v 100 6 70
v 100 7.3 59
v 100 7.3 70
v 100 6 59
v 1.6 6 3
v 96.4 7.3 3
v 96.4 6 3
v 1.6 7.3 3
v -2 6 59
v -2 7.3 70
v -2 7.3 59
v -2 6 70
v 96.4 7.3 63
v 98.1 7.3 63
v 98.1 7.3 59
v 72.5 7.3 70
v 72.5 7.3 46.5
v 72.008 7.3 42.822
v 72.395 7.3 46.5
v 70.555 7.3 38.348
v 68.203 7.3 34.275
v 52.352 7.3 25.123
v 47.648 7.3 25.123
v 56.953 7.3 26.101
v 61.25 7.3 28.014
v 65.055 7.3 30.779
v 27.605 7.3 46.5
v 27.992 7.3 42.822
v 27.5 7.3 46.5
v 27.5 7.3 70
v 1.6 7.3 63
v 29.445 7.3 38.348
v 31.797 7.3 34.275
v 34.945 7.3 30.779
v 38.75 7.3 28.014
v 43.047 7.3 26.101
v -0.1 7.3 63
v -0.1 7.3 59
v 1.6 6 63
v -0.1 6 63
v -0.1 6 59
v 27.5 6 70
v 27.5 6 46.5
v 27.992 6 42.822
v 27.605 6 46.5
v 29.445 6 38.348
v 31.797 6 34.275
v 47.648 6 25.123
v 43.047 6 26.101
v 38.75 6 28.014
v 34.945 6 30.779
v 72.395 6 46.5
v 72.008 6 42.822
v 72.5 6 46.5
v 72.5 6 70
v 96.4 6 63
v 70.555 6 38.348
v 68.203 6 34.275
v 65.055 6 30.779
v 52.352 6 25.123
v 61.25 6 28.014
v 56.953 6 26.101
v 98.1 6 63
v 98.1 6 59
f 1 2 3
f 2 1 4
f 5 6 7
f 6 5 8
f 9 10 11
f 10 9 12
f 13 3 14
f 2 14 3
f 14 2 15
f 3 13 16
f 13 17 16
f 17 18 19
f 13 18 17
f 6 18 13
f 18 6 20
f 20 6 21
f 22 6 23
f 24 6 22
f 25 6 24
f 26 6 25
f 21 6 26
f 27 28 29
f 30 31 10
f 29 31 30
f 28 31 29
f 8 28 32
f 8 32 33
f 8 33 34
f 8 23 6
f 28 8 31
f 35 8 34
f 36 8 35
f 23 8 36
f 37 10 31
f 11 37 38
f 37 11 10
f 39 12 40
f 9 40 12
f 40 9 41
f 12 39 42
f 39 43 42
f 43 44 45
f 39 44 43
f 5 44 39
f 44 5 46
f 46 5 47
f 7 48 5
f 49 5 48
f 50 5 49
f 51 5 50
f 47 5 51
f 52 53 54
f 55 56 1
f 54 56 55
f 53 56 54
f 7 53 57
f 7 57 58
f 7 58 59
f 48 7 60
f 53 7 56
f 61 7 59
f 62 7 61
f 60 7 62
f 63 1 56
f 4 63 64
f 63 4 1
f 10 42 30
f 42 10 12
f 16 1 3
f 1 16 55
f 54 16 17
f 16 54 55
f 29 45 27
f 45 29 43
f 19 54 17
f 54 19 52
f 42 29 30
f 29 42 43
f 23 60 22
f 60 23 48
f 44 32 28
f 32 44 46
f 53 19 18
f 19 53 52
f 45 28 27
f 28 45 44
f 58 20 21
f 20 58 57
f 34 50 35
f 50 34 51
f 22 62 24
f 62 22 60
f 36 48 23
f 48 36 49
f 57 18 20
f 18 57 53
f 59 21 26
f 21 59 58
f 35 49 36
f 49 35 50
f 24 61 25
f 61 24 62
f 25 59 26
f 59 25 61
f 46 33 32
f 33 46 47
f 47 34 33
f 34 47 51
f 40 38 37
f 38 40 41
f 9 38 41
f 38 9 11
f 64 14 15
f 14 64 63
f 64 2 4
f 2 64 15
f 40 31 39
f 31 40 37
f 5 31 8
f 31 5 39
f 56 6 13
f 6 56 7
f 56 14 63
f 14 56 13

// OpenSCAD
/* [Box Parameters] */


innerWidth = 95;
innerDepth = 145;
innerHeight = 80;

wallThick = 1.5;
totalWidth = innerWidth + (wallThick*2);
cutoutHeight = 30;
cutoutWidth = 45;

cutoutOffsetX = ((wallThick * 2) + innerWidth) / 2 - (cutoutWidth / 2);
cutoutOffsetZ = wallThick + innerHeight - cutoutHeight;
/*
difference() {
    cube([innerWidth + (wallThick * 2),innerDepth + (wallThick * 2),innerHeight + wallThick]);
    translate([wallThick,wallThick,wallThick]) cube([innerWidth,innerDepth,innerHeight + 3]);
    translate([cutoutOffsetX,-1,cutoutOffsetZ]) cube([cutoutWidth,wallThick * 4 + innerDepth,cutoutHeight + 3]);

    translate([cutoutOffsetX,0,innerHeight+wallThick]) rotate([270,90,0])fillet(10,5);

    translate([cutoutOffsetX,innerDepth + wallThick,innerHeight+wallThick]) rotate([270,90,0])fillet(10,5);

    translate([innerWidth+wallThick*2-cutoutOffsetX,0,innerHeight+wallThick]) rotate([90,90,0])fillet(10,5);

    translate([innerWidth+wallThick*2-cutoutOffsetX,innerDepth + wallThick,innerHeight+wallThick]) rotate([90,90,0])fillet(10,5);
    for(i = [12:15:innerDepth-10]) {
        ident(i);
    } 

    color("blue") translate([(innerWidth+(wallThick * 2))/2,150,cutoutOffsetZ])  rotate ([90, 0,0]) cylinder(h=155, r=22.5);
}
  */

   //color("blue") translate([-5,2,60]) cube([105,60,120]);  
//    cube([innerWidth + (wallThick * 2),innerDepth + (wallThick * 2),innerHeight + wallThick]);
//anslate([wallThick,wallThick,wallThick]) cube([innerWidth,innerDepth,innerHeight + 3]);
 difference() {
    translate([-2,6   , 3])color("red") cube([innerWidth + (wallThick * 2)+4,wallThick-0.2,innerHeight - wallThick]);


    color("green") rotate ([90, 0,0]) translate([-5,70,-20]) cube([120, 20, 38]);    
    color("blue") translate([cutoutOffsetX+1,-1.5,cutoutOffsetZ-5]) cube([cutoutWidth,wallThick * 4 + innerDepth,cutoutHeight + 3]);
    color("blue") translate([(innerWidth+(wallThick * 2))/2+1,8,cutoutOffsetZ-4])  rotate ([90, 0,0]) cylinder(h=155, r=22.5);
    color("pink")  rotate ([90, 0,0]) translate([-2.1,0,-20]) cube([2,  59, 38]);
    color("pink")  rotate ([90, 0,0]) translate([98.1,0,-20]) cube([2,  59, 38]);
    color("green") rotate ([90, 0,0]) translate([-0.1,0,-20]) cube([1.7, 63, 38]);
    color("green") rotate ([90, 0,0]) translate([96.4,0,-20]) cube([1.7, 63, 38]);

}

/*
font1 = "Liberation Sans"; // here you can select other font type
content = "Bosses";
translate ([totalWidth/2,-1,30]) {
    rotate ([90, 0,0]) {
        //linear_extrude(height = 1.5) {
            text(content, font = font1, size = 20, direction = "ltr", spacing = 1, halign = "center" );
        //}
    }
}
*/
 
    //translate([innerWidth+(wallThick*2),20,innerHeight-28]) rotate([0,0,90]) scale([4,2,20]) cube(wallThick);
    //translate([wallThick+1,20,innerHeight-28]) rotate([0,0,90]) scale([4,2,20]) cube(wallThick);
   // translate([wallThick,20,innerHeight]) rotate([0,0,90]) scale([0.5,1,2]) cube(wallThick);

module fillet(r, h) {
    translate([r / 2, r / 2, 0])

        difference() {
            cube([r + 0.01, r + 0.01, h], center = true);

            translate([r/2, r/2, 0])
                cylinder(r = r, h = h + 1, center = true);

        }
}

module ident (y) {
    translate([3,y,62]) rotate([0,0,90]) cube([2.5, 6.5, 20]);
    translate([100,y,62]) rotate([0,0,90]) cube([2.5, 6.5, 20]);

    
}
